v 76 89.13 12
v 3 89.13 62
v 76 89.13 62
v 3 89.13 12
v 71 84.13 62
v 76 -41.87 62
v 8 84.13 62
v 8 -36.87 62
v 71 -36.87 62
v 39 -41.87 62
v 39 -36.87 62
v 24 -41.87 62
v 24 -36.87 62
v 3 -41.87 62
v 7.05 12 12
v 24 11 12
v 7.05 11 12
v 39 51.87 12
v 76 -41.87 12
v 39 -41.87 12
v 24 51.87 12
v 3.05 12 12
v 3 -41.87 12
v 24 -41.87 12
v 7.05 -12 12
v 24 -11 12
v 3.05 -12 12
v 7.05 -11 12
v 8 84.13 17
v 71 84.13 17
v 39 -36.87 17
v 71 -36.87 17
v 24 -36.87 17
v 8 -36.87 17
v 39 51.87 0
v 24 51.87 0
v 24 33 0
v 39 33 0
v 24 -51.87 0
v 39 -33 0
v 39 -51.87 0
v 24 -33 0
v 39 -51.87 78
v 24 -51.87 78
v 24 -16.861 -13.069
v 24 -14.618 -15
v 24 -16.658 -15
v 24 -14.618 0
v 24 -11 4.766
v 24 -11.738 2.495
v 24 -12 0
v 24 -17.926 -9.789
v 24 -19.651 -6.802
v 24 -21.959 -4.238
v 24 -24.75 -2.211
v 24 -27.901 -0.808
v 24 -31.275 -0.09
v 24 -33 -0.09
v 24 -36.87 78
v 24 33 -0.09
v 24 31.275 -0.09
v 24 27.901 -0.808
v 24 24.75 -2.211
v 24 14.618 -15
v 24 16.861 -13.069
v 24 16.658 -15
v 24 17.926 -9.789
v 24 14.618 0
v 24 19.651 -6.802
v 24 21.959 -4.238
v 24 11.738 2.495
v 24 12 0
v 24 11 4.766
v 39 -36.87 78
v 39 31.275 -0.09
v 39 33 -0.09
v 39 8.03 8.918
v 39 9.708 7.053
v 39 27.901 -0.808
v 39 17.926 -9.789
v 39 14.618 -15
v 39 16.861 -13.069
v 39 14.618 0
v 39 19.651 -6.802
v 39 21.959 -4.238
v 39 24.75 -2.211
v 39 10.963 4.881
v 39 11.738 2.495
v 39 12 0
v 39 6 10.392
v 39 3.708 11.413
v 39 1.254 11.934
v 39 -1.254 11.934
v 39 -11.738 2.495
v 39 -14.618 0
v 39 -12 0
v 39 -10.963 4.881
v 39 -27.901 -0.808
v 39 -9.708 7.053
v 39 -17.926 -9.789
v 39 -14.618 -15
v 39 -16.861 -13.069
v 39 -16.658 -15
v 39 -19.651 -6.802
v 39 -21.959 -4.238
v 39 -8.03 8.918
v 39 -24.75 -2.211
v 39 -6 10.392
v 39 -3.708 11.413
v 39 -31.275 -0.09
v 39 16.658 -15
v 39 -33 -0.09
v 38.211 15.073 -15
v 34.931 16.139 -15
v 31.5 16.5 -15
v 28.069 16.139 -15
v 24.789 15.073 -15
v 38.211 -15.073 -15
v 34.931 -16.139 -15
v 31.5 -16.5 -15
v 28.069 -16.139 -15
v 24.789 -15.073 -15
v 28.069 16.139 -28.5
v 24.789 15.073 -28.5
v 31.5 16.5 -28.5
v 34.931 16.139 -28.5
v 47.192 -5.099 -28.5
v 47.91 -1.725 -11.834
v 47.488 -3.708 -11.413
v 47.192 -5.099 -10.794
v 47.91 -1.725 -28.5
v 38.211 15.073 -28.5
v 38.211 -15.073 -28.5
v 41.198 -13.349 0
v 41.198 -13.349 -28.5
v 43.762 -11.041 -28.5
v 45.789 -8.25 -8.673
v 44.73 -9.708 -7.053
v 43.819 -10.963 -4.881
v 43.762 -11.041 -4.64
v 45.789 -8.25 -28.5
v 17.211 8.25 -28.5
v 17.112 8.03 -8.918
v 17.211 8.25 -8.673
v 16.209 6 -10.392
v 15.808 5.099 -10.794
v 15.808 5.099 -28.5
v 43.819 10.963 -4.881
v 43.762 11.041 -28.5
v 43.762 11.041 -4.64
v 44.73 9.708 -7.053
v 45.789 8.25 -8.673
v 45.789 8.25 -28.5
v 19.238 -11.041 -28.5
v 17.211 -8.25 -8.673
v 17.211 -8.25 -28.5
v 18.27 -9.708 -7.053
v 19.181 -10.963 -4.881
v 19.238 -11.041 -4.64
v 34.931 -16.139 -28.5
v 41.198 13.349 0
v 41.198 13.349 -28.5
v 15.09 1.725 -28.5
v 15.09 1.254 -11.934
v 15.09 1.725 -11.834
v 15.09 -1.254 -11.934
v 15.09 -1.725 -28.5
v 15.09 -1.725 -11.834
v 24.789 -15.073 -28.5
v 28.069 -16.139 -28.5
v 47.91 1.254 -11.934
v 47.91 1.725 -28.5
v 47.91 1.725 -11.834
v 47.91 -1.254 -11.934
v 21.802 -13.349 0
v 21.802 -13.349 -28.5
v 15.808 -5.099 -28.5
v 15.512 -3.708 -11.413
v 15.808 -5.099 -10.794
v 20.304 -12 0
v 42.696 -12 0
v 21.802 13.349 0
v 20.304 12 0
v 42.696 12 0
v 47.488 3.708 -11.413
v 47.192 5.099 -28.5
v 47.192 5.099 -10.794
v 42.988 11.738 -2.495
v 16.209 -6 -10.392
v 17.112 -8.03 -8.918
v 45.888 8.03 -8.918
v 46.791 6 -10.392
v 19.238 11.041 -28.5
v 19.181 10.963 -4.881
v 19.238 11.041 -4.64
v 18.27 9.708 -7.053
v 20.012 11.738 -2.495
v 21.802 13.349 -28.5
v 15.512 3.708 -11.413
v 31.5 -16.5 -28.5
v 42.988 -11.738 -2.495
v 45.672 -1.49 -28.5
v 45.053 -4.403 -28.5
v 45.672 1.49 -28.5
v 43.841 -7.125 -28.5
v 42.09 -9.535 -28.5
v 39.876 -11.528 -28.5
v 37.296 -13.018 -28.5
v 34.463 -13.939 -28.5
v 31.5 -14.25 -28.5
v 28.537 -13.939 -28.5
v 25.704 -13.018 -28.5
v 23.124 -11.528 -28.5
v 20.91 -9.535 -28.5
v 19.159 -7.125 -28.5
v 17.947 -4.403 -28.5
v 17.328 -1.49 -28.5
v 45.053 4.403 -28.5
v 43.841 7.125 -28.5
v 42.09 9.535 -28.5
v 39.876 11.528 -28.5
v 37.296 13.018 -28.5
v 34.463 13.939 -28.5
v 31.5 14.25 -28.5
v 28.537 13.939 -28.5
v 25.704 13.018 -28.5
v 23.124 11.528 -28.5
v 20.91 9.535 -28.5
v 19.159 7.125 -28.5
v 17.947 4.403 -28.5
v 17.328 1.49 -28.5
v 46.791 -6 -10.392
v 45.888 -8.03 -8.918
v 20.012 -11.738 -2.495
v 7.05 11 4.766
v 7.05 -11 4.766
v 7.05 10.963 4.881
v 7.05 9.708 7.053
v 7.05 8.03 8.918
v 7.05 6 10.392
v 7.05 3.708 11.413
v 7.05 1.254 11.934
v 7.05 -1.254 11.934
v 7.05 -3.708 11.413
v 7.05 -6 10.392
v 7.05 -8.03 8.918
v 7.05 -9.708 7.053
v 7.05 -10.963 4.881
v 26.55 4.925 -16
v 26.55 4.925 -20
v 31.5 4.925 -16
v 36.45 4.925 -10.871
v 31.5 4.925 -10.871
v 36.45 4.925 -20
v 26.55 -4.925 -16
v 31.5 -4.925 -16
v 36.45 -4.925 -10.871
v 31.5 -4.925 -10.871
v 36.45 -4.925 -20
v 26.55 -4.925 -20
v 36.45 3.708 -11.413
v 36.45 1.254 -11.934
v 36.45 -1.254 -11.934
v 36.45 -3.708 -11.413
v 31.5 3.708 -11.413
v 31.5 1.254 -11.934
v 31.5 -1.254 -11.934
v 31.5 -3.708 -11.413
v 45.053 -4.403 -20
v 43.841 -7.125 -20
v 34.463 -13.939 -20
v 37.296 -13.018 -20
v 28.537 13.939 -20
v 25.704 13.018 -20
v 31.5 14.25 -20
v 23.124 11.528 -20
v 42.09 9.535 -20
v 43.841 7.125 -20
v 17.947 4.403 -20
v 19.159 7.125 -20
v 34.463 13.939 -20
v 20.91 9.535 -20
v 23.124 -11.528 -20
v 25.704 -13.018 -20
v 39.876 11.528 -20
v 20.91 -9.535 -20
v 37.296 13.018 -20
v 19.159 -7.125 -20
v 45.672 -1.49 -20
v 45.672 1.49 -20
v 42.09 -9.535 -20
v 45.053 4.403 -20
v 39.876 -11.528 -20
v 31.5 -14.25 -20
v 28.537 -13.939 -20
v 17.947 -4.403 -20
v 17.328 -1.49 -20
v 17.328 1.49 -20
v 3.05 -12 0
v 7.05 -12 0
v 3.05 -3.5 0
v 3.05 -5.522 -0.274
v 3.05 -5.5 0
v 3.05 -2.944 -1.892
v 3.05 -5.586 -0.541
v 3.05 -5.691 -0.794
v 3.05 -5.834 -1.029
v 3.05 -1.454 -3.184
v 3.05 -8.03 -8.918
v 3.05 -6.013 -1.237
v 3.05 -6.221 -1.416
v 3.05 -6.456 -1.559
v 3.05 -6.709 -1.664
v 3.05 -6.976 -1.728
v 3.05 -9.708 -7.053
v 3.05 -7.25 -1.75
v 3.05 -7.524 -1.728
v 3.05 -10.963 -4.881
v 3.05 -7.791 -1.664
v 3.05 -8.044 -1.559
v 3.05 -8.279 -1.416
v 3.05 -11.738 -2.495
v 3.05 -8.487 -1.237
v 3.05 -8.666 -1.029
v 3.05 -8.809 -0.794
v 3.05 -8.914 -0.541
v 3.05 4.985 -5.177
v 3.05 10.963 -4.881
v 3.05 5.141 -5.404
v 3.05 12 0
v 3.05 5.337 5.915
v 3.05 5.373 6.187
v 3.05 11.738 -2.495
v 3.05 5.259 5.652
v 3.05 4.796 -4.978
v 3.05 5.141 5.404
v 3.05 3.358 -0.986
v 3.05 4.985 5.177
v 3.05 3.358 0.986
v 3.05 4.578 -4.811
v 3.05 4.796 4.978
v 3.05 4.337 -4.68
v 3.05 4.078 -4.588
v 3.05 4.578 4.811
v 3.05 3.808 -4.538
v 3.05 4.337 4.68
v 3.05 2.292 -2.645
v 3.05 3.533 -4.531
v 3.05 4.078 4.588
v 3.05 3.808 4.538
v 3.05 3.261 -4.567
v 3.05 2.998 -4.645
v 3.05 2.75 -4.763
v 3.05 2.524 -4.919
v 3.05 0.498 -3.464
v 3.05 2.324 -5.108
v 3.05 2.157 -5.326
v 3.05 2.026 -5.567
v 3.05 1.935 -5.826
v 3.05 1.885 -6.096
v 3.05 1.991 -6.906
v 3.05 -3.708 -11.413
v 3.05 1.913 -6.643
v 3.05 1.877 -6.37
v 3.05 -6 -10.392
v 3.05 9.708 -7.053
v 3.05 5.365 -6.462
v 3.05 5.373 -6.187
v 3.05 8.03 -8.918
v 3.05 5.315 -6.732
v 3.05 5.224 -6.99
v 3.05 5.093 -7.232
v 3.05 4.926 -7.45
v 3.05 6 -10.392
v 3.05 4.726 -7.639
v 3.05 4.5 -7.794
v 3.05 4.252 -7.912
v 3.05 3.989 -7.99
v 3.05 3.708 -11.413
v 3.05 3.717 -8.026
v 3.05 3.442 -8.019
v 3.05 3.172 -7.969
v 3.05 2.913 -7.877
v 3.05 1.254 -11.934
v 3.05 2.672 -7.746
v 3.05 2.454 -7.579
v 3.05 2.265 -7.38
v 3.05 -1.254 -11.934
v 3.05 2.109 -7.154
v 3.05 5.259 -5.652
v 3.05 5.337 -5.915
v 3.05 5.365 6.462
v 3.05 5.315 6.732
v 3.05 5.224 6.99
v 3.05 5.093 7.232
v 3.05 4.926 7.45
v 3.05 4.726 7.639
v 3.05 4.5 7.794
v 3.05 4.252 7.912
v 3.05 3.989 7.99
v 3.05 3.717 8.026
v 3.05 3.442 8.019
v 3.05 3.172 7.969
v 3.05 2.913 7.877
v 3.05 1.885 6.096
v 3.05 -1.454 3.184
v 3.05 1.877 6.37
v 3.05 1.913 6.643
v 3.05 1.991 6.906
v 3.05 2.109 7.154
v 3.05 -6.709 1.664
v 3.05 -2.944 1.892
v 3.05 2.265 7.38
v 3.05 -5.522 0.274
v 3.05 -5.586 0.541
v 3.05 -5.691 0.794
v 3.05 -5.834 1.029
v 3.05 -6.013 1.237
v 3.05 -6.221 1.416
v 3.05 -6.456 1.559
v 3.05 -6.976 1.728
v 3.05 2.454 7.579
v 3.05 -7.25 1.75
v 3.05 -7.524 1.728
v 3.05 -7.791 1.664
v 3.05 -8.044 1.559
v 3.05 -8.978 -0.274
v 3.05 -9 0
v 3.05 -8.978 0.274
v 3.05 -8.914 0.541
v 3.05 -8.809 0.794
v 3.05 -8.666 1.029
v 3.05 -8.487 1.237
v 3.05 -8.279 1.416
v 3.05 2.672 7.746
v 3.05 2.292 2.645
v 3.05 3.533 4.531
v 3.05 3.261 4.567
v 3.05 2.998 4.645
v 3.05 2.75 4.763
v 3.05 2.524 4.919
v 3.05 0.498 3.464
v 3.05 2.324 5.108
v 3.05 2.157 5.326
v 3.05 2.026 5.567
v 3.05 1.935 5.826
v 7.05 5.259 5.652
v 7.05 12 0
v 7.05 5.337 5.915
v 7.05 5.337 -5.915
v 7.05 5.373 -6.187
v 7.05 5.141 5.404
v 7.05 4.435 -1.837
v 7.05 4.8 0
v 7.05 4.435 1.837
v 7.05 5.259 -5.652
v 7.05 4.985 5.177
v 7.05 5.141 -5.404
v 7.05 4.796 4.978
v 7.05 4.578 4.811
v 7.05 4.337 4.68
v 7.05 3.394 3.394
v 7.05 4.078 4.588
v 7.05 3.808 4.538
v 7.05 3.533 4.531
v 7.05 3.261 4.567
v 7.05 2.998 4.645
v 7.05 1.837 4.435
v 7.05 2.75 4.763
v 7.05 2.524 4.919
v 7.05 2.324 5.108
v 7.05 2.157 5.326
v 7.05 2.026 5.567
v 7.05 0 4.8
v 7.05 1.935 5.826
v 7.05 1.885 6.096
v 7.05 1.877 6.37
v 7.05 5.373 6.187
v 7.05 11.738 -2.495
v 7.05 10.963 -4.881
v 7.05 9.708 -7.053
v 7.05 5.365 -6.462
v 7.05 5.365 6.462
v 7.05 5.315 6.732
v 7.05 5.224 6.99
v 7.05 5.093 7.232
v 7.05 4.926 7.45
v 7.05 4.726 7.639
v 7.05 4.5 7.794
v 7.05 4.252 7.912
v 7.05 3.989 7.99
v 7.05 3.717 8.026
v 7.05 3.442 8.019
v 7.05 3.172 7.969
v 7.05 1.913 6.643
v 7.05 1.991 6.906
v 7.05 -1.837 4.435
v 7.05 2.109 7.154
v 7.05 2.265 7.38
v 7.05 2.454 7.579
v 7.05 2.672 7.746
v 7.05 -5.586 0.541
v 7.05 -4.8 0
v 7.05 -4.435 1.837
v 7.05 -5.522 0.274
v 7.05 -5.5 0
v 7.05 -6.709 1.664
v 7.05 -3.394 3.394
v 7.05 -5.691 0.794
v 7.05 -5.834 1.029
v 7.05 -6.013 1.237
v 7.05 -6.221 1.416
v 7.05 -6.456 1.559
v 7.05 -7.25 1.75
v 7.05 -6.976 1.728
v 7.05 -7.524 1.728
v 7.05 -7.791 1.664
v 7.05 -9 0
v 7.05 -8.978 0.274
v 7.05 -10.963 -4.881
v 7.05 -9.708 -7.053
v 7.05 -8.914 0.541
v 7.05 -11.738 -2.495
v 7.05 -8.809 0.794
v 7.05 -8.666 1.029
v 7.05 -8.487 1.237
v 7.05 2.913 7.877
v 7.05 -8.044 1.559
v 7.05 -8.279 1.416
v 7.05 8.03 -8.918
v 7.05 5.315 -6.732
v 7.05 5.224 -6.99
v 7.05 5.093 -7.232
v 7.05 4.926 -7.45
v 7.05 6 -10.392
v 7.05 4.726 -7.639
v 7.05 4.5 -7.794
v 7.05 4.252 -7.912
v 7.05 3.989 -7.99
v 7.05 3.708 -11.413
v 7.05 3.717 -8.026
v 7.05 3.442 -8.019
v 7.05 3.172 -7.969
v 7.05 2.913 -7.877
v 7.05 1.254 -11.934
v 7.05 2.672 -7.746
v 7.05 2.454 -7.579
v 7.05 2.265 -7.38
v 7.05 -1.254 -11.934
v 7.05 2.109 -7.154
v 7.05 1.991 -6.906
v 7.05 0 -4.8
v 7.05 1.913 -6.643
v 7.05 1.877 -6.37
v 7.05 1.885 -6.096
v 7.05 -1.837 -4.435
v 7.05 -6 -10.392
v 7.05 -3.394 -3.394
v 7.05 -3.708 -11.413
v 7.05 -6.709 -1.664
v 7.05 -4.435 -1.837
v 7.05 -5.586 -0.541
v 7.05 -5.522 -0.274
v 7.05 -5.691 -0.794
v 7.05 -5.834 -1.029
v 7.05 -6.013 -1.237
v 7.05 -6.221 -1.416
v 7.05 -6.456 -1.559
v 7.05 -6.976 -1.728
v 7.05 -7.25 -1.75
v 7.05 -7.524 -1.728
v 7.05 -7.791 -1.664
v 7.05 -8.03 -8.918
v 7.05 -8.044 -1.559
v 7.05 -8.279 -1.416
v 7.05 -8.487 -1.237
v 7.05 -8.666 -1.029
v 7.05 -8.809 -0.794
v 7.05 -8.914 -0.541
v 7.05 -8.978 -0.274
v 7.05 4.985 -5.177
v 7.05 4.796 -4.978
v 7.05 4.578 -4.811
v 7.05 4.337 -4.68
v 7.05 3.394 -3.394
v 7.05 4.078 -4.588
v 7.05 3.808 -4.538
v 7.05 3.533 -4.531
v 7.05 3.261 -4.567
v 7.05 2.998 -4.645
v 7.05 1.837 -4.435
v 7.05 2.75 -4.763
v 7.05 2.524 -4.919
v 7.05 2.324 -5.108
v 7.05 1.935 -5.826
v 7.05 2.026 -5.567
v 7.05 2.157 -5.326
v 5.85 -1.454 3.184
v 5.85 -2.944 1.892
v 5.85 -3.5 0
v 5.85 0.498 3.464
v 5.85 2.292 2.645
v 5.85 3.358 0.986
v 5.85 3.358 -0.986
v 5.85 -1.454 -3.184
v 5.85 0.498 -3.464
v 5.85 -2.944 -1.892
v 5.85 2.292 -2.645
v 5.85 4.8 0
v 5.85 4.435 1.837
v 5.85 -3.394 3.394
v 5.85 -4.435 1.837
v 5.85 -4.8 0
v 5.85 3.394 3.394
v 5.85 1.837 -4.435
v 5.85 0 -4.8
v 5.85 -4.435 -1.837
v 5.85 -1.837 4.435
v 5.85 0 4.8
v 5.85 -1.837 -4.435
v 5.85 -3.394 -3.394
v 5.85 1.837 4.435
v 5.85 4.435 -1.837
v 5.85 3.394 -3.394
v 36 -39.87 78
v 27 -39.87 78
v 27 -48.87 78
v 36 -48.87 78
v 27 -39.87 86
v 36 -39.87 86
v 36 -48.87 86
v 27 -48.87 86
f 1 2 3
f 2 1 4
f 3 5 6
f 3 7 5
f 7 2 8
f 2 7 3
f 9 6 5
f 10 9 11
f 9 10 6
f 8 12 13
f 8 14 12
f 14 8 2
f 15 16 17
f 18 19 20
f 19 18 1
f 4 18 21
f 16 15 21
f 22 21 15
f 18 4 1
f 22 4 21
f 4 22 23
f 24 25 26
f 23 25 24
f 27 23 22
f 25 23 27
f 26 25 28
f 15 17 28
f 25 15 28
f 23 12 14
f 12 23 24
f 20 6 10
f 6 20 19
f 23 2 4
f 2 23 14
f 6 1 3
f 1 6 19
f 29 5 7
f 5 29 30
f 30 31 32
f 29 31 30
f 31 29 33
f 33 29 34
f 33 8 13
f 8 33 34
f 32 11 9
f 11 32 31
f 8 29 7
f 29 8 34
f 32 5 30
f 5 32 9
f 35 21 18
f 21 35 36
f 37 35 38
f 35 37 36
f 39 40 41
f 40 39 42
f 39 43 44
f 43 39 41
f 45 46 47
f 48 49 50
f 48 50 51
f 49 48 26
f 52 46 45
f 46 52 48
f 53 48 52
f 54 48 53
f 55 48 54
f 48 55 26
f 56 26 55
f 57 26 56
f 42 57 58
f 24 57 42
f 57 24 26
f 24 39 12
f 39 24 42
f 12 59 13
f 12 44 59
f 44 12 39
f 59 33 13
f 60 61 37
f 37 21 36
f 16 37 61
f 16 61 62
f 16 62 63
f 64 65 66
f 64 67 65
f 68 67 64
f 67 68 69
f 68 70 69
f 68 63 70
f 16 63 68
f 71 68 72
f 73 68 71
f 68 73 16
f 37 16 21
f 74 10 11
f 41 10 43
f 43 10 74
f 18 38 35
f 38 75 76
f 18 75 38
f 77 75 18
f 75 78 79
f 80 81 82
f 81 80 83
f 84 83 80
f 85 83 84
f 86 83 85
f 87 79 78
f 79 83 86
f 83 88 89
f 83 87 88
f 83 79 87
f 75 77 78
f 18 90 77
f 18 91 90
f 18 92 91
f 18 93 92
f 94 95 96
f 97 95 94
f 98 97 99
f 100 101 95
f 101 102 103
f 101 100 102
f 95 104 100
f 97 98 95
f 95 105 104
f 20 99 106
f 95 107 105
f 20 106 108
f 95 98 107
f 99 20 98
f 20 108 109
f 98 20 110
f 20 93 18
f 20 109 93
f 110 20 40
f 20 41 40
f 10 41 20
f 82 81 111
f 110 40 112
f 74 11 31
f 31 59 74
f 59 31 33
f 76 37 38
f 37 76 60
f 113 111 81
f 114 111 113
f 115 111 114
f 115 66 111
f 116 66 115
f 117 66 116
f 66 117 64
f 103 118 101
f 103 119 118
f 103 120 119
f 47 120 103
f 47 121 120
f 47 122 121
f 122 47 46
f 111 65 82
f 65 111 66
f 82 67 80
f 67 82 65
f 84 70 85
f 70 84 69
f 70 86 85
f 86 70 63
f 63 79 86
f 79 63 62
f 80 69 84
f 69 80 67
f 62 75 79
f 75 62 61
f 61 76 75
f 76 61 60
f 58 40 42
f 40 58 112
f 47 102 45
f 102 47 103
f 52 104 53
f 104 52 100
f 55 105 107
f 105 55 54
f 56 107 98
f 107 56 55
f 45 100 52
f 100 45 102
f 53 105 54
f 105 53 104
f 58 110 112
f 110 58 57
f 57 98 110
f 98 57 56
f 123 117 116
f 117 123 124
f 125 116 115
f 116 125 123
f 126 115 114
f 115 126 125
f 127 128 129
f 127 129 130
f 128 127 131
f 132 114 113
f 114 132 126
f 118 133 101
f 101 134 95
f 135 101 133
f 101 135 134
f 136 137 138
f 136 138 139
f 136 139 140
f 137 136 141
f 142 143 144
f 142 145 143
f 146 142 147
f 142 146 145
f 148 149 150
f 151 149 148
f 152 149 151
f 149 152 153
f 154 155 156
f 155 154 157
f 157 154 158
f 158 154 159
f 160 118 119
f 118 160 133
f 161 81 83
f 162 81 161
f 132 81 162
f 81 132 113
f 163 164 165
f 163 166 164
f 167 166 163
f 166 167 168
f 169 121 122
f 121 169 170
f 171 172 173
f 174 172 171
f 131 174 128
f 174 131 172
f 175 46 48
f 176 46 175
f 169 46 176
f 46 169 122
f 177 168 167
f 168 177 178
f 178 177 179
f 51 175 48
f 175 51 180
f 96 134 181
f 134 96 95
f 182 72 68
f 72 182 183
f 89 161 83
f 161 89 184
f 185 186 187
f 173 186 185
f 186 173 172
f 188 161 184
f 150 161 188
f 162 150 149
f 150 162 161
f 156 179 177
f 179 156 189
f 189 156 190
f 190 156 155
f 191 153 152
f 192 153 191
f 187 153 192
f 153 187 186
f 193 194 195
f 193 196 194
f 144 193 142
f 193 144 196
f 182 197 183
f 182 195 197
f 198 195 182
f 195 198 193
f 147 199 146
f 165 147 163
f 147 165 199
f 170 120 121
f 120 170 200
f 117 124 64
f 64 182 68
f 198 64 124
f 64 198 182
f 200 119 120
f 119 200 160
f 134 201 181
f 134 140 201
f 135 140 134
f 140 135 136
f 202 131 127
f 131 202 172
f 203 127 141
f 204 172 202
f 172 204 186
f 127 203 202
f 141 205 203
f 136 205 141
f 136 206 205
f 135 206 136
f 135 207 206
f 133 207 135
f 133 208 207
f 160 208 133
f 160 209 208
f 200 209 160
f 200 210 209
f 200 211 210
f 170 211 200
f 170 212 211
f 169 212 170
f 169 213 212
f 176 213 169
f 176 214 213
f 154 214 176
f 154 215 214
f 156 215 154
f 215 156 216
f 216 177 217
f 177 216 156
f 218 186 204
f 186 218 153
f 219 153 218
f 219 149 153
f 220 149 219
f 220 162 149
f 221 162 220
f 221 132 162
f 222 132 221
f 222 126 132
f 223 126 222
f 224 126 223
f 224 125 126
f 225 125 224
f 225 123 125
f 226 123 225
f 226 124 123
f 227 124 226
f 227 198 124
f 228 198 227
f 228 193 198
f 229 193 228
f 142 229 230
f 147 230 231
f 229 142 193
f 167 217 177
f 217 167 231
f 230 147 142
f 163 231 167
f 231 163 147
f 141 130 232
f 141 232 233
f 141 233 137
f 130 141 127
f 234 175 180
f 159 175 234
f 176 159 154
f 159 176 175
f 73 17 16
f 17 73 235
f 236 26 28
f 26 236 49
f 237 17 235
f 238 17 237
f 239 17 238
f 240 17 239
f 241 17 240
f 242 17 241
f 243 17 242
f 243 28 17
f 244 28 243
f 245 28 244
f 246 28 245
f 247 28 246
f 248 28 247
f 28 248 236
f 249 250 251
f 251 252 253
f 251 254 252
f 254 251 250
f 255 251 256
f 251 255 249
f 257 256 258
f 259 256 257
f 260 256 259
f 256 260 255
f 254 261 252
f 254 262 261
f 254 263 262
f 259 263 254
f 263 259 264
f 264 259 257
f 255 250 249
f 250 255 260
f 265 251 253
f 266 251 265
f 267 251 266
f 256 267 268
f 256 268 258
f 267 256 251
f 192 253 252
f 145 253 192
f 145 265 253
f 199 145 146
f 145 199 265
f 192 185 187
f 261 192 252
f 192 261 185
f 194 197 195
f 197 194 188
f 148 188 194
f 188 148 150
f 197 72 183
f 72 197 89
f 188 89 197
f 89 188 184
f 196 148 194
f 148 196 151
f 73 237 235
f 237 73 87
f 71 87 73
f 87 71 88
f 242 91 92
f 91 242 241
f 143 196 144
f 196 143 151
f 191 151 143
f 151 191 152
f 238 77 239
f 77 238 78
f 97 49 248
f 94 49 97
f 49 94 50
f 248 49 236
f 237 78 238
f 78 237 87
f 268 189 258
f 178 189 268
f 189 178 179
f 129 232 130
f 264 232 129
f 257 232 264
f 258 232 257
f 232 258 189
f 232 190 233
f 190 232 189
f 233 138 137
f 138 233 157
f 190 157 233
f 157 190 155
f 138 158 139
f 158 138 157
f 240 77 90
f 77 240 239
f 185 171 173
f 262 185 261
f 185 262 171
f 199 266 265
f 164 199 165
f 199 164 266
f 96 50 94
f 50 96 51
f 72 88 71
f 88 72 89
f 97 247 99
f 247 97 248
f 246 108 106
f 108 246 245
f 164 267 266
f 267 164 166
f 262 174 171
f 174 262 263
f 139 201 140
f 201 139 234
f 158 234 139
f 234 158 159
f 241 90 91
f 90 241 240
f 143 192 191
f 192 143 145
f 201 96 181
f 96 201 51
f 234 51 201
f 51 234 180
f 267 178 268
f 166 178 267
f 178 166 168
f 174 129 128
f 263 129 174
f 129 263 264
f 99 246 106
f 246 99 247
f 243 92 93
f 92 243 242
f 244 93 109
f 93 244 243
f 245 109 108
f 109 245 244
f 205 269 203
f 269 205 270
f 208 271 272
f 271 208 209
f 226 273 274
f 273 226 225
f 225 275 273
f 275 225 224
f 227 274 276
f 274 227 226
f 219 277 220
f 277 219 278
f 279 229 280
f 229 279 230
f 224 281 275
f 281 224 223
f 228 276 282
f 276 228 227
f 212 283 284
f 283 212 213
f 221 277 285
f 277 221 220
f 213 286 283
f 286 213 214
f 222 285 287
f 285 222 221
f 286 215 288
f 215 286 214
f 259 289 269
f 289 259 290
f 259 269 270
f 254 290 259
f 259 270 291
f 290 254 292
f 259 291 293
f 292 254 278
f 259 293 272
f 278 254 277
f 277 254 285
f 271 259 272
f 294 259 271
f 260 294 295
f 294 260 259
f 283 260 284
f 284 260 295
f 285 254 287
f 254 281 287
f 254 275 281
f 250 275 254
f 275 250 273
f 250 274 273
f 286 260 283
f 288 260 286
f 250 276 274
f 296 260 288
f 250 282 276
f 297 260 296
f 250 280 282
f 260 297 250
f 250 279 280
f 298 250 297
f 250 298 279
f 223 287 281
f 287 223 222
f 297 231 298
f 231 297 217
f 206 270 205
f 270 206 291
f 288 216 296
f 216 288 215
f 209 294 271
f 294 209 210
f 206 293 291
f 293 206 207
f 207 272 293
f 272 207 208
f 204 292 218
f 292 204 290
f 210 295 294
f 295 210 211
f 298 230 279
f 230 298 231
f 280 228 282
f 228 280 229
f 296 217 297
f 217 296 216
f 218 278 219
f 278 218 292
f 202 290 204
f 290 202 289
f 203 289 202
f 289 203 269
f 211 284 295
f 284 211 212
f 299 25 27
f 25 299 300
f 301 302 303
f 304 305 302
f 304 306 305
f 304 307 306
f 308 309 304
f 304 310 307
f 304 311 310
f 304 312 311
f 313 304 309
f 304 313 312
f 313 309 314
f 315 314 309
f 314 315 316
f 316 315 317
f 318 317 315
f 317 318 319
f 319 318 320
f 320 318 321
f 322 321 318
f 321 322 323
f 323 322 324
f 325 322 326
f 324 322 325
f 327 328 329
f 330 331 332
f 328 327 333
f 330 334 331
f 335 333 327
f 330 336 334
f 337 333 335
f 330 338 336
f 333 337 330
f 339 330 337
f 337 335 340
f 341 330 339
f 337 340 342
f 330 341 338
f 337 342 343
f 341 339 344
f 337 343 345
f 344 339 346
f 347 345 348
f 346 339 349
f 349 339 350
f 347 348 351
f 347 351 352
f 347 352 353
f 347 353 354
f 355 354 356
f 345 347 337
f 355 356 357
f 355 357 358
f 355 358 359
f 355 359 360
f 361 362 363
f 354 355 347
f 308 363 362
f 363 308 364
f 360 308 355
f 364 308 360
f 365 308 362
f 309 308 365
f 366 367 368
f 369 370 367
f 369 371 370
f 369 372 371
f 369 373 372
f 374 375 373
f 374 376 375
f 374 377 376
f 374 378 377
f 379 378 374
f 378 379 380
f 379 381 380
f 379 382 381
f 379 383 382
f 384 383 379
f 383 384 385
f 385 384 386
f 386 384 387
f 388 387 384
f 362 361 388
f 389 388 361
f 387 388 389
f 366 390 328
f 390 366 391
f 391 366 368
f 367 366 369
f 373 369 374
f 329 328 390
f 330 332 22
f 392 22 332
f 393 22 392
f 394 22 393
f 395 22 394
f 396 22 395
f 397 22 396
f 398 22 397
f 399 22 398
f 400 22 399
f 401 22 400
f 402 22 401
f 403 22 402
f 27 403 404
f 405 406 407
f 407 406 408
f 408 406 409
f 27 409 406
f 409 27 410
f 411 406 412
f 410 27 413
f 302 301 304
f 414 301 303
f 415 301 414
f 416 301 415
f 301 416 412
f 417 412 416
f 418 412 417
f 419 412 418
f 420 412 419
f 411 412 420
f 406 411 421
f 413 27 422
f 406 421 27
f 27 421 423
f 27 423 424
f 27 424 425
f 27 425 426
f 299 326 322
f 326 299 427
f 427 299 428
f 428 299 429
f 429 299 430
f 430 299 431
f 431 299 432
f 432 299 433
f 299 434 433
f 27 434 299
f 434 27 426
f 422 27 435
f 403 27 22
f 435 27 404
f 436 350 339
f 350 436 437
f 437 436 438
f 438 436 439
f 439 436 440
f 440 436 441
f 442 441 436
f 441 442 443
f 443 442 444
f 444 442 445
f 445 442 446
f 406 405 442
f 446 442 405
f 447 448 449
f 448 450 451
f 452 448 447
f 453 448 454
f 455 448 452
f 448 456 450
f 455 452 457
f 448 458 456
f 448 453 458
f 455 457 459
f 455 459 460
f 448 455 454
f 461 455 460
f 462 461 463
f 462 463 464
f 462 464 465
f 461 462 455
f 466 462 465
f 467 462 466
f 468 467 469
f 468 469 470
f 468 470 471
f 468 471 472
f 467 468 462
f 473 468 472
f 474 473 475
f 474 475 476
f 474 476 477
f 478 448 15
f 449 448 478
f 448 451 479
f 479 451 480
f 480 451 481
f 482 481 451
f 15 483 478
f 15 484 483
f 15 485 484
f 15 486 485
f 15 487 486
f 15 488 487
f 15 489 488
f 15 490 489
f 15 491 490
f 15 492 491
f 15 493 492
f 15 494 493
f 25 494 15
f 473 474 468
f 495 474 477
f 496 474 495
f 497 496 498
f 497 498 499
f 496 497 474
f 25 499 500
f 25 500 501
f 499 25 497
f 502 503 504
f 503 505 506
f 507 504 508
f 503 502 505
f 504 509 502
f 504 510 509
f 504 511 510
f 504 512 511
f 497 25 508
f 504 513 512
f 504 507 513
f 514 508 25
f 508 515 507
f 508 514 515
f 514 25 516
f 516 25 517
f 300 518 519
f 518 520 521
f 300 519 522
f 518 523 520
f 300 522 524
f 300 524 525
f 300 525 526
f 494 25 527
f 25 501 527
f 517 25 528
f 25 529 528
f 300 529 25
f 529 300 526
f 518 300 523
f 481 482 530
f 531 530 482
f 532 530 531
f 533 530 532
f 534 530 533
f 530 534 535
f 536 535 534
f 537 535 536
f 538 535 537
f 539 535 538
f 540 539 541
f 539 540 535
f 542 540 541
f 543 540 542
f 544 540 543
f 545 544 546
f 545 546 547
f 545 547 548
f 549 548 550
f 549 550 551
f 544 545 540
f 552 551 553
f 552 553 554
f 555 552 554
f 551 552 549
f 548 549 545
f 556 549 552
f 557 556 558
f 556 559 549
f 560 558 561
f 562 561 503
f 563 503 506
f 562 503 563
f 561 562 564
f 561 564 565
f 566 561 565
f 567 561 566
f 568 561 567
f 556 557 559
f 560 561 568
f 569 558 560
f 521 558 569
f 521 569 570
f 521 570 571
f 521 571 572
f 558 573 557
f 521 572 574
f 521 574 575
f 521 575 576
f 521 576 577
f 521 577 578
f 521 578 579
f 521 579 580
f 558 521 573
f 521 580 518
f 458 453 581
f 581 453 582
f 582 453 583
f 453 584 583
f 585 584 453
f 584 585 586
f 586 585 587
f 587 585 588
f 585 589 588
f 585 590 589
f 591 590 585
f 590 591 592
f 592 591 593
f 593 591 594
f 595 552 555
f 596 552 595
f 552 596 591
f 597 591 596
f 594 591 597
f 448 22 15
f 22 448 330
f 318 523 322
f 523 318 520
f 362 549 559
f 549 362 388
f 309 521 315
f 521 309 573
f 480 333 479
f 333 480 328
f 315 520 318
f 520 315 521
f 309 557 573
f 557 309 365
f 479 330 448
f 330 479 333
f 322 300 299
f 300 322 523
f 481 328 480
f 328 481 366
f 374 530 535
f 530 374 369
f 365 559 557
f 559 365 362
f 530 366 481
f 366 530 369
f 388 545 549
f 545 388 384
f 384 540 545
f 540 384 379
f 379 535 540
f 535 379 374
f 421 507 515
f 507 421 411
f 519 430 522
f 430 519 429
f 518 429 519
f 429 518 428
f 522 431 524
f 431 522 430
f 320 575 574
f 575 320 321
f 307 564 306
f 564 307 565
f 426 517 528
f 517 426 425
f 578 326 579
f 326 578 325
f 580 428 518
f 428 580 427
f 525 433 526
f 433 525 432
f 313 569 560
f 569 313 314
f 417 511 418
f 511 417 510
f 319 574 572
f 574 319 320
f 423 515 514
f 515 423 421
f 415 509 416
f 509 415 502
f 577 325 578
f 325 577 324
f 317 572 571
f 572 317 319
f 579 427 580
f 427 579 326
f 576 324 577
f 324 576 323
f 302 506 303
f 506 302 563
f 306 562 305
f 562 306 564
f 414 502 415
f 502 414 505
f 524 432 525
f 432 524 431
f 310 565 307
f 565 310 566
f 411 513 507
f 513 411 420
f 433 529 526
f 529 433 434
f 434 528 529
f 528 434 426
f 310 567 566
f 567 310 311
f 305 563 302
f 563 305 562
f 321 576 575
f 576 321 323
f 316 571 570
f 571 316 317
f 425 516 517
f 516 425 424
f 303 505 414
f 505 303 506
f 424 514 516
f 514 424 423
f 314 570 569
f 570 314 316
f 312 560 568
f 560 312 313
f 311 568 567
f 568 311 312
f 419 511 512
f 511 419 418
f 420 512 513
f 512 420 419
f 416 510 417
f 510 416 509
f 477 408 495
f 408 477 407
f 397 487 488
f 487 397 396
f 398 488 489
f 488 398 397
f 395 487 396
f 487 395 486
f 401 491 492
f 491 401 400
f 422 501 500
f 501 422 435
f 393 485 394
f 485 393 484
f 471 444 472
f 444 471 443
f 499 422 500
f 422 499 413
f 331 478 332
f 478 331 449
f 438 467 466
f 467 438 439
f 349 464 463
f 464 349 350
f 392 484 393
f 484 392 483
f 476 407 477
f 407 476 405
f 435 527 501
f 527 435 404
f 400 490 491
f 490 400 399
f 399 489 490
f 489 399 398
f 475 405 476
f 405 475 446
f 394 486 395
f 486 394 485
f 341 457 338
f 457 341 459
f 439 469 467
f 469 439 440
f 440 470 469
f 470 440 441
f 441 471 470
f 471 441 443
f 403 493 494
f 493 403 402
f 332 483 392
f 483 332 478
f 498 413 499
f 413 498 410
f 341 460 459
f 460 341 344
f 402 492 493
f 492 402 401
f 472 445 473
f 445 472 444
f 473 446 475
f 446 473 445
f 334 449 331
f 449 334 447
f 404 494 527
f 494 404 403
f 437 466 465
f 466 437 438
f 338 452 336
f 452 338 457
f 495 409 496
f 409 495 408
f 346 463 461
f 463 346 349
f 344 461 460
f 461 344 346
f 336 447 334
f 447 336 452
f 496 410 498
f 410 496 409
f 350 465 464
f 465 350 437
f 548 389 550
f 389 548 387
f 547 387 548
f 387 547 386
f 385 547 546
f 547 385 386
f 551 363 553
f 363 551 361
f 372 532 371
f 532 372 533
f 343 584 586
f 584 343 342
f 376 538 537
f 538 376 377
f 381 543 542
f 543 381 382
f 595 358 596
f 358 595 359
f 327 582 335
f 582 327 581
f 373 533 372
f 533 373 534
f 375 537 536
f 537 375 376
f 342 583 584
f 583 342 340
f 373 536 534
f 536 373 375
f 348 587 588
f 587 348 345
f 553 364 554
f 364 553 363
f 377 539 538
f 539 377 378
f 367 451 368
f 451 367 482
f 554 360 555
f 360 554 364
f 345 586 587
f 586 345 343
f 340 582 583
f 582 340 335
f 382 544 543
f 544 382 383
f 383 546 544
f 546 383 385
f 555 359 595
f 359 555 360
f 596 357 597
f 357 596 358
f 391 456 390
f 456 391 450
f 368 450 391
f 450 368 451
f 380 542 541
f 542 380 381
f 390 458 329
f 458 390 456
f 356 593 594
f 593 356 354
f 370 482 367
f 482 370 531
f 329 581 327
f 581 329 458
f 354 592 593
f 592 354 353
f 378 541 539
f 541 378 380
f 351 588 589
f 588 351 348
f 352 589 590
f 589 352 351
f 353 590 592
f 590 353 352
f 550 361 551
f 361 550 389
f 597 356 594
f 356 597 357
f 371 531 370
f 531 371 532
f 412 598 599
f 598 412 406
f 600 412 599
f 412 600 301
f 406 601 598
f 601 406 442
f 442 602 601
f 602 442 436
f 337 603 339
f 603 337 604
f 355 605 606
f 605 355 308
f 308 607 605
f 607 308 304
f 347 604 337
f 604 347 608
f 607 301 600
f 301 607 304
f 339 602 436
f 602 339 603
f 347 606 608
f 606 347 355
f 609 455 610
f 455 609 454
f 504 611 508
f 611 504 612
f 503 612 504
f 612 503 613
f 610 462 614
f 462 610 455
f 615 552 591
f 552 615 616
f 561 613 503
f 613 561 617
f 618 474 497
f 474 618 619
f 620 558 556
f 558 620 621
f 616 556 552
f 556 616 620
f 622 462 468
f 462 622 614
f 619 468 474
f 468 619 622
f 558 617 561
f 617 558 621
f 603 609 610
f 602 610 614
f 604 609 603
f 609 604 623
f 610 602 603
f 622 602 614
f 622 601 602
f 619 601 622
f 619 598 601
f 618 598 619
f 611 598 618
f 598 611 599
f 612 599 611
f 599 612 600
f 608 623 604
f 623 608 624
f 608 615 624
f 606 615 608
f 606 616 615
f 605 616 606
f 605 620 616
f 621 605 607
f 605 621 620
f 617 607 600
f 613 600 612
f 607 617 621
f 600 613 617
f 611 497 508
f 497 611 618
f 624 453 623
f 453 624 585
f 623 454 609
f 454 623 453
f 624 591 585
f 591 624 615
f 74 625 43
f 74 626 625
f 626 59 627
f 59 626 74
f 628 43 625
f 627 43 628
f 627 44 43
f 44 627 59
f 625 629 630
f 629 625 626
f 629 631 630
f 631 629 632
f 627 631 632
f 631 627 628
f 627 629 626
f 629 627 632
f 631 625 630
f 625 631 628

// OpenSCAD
// file: tripodBase.scad
include <params.scad>
use <motor.scad>
use <parametric_gear.scad>
use <tripodArm.scad>
/*
   translate([0,0,-gearDistance]) tribase();
 *translate([0,-motorL1,0]) rotate(-90,[1,0,0]) faulhaber();
 *translate([0,0,-gearDistance+15+bearingH]) rotate(180,[1,0,0]) potentiometer();
 tripodArm();
 */
tribase();
module tribase(){
  difference(){
    union(){
      bevel_gear_pair(
          gear1_teeth = 18,
          gear2_teeth = 8
          );
      *translate([0,0,16.5]) union(){
        cylinder(r=bearingBW/2,h=bearingT);
        difference(){
          cylinder(r=bearingIW/2,h=bearingH+bearingT);
          translate([0,0,bearingH+bearingT]) rotate(180,[1,0,0]) potentiometer();
        }
      }
      *translate([0,0,-25]) cylinder(r=27,h=30);
    }
    *for(n=[0,1,-1]){
      rotate([-30,0,120*n]) baseleg();
    }
  }
}
module baseleg(w=legW,l=legL, h=legH){
  translate([-w/2,-l/3,-h/2]) union(){
    cube([w,30,h]);
    translate([5,30,0]) cube([10,100,10]);
  }
}
// file: canHolder.scad
include <params.scad>


module motorAttachment(rA,rB,h,mH,rC,d){
  difference()
  {
    cylinder(r=rA,h=h,$fn=30);
    translate([0,0,h-mH]) cylinder(r=rB,h=mH,$fn=50);
    translate([0,0,h-d]) rotate([90,0,0]) cylinder(r=rC,h=rA, $fn=40); 
    translate([0,0,h-d]) rotate([-90,0,0]) cylinder(r=rC,h=rA, $fn=40); 
    translate([0,0,h-d-rC*1.5]) rotate([0,90,0]) cylinder(r=rC,h=rA, $fn=40); 
    translate([0,0,h-d-rC*1.5]) rotate([0,-90,0]) cylinder(r=rC,h=rA, $fn=40); 
  }
}
// file: motor.scad
include <params.scad>

faulhaber();
module faulhaber(d1 = motorD1, d2 = motorD2 ,d3 = motorDsh,df3 = motorDfl,l1 = motorL1,l2 = motorL2, l3 = motorL3){
  union(){
    color("black") cylinder(r=d1/2,h=l1);
    difference(){
      color("blue",0.9) translate([0,0,l1]) cylinder(r=d2/2,h=l2);
      translate([0,0,l1+l2]) motorHoles();
    }
    color("silver") translate([0,0,l1+l2]) motorShaft();
  }
}
module motorShaft(d=motorDsh,df=motorDfl,h=motorL3){
  difference(){ 
    cylinder(r=d/2,h=h,$fn=80);
    translate([-d/2,d/2-(d-df),0]) cube([d,d,h+2]);
    echo(d-df);
  }
}

module motorHoles(d = motorScrewD,l=motorHoleLenTo,h = motorScrewL){
  translate([0,0,-h])  union(){
    translate([l,0,0]) cylinder(r=d/2,h=h,$fn=40);
    rotate([0,0,120]) translate([l,0,0]) cylinder(r=d/2,h=h,$fn=40);
    rotate([0,0,-120]) translate([l,0,0]) cylinder(r=d/2,h=h,$fn=40);
  }
}
// file: params.scad
inch = 25.4;

canDiameter = 3.1*inch;
canLength = 9.2 * inch;

bearingW1 = 28+0.5;
bearingW2 = 32+1;
bearingIW = 16;
bearingBW = 25;
bearingH = 8;
bearingT = 1;

motorD1 = 22;
motorD2 = 20;
motorDfl = 3.6+0.25;
motorDsh = 4+0.25;
motorFl = 7.5;
motorL1 = 23.45;
motorL2 = 47.8-motorL1;
motorL3 = 64.52 - 3.08 - motorL1 - motorL2;

motorScrewD = 2.5;
motorHoleLenTo = motorD2/2 -( 1.5+motorScrewD/2);
motorScrewL = 4;
canToclampTolerance = 2;
clampLength = canLength / 2;
clampThickness = 5;
clampSpace = 25;

brainH = 45;
brainW = 63;
brainL = 121;
boxT = 5;
boxClearance = 10;

armInnerW = canDiameter + clampThickness*2;
armThickness = 15;
armHeight = canDiameter/2 + clampThickness + brainH + boxClearance; 

gearDistance = 42+1.5;
legW = 20-0.5;
legL = 200;
legH = legW;

potTh = 4.5;
potW = 9.6 + 0.25;
potL = 9.65 + 0.25;
potLen = 12.63-potTh;
potRad = 3.55/2+0.25;
potSlit = 1;
potSlitL = 1.5;

megaR = 1.3;
megaIn = 2.5;
megadx = 24.1;
megadxy = 15.2;
megady = 27.9;
// main file
include <params.scad>
use <motor.scad>
use <canHolder.scad>
use <parametric_gear.scad>
use <tripodBase.scad>
module tripodArm(
    w=armInnerW, 
    t = armThickness, 
    h = armHeight){
  union(){
    translate([-w/2+t/2,-8,motorD1/2+1]) brainBox();
    difference(){
      union(){
        translate([0,0,(h+2*t)/2]) difference(){
          cube([w + t, t, h+2*t],center=true);
          translate([t/2,0,t/2 + 1/2]) cube([ w, t, h+t + 1],center=true);
        }
        translate([0,0,-gearDistance+15]) cylinder(r=bearingW2/2,h=gearDistance-15);
        for(n = [0,1]){
          difference(){
            rotate(180*n,[0,0,1]) translate([0,-t/2,-t]) cube([bearingW2,t,bearingW2/2]);
            rotate(180*n,[0,0,1]) translate([bearingW2,t/2+1,-bearingW2/2]) rotate(90,[1,0,0]) cylinder(r=bearingW2/2,h=t+2);
          }
        }
        // motor mount arm
        translate([-motorD1/2,0,0]) cube([motorD1,motorL1+1,t]);
      }
      translate([0,-motorL1,0]) rotate(-90,[1,0,0]) cylinder(r=motorD1/2+1,h=motorL1+motorL2+5);
      translate([0,0,-gearDistance+15]) cylinder(r=bearingW1/2,h=bearingH+.5);
      translate([0,0,-gearDistance+15+bearingH]) rotate(180,[1,0,0]) potentiometer();
    }
    // motor mount
    rotate(180,[0,1,0]) translate([0,motorL1+1,0]) 
      rotate(-90,[1,0,0]) difference(){
        union(){
          translate([-motorD1/2-1,0,0]) cube([motorD1+2,motorD1/2+t-motorD1/2,4]);
          cylinder(r=motorD1/2+1,h=4);
        }
        translate([0,0,4]) motorHoles(d = motorScrewD+1,l=motorHoleLenTo,h = 4);
        cylinder(r=3.5,h=4);
        cylinder(r=4.8,h=1.2);
      }
  }
}

module potentiometer(t = potTh, w=potW, d = potL, r=potRad, l=potLen, s=potSlit,sl = potSlitL){
  translate([0,0,-t]) union(){
    difference(){
      color("white") translate([0,0,t]) cylinder(r=r,h=l,$fn=20);
      translate([-r,-s/2,t+l-sl]) cube([r*2,s,sl]);
    }
    color("blue", 0.9) translate([-w/2,-d/2,0]) cube([w,d,t]);
    color("silver", 0.9) translate([-w/2,0,-11+t]) cube([w,d/2,11]);
  }
}

module bearing(
    d1 = bearingW1,
    d2 = bearingW2,
    d3 = bearingIW,
    h = bearingH,
    t = bearingT){
  difference(){
    union(){
      cylinder(r=d2/2,h=t,$fn=80);
      cylinder(r=d1/2,h=h+t,$fn=80);

    }
    cylinder(r=d3/2,h=h+t);
  }
}
module brainBox(
    t = boxT,
    w = brainW,
    l = brainL,
    h = brainH
    ){
  translate([-t,-t-w/2,0]) difference(){
    cube([l+2*t,w+2*t,h+t]);
    translate([t,t,t]) cube([l,w,h]);
  }
}
module canClamp(r1 = canDiameter/2+clampThickness, r2 = canDiameter/2-canToclampTolerance, h = clampLength, sw=clampSpace){
  difference()
  {
    union(){
      translate([0,0,h-10]) cylinder(r=r1,h=10,$fn=500);
      translate([0,0,h/2-7.5]) cylinder(r=r1,h=15,$fn=500);
      cylinder(r=r1,h=10,$fn=500);
#translate([-r1,canToclampTolerance/2,0]) cube([2*r1,r1-r2,h]);
    }
    cylinder(r=r2,h=h);
    translate([0,r1/2,h/2]) cube([sw*2,r1,h],center=true);
    translate([-100,armThickness/2,0]) cube([200,100,h]);
  }
}




%translate([-canDiameter/2-10,0,0]) union(){
translate([0, clampLength/2, armHeight + 2*armThickness-clampThickness - canToclampTolerance]) rotate([90,0,0]) canClamp();
union(){
  difference(){
    rotate(90,[0,0,0]) tripodArm();
    translate([-armInnerW/2 - armThickness,-armThickness,0]) 
      translate([-250,250,armHeight  + 2*armThickness - canDiameter/2 - 2*clampThickness -  canToclampTolerance]) rotate([180,0,0]) cube([500,500,300]);
  translate([-armThickness/2+ 2.5 -armInnerW/2,-armThickness/2+2.5,armHeight  + 2*armThickness - canDiameter/2 - 2*clampThickness -  canToclampTolerance]) cube([armThickness-5,armThickness-5,8]);
  }
}
}



translate([brainW/2,0,0]) rotate([0,0,90]) union(){
  difference(){
    rotate(90,[0,0,0]) tripodArm();
    translate([-armInnerW/2 - armThickness,-armThickness,0]) 
      translate([0,0,armHeight  + 2*armThickness - canDiameter/2 - 2*clampThickness -  canToclampTolerance]) cube([500,500,300]);
  }
  translate([-armThickness/2+ 3 -armInnerW/2,-armThickness/2+ 3 ,armHeight  + 2*armThickness - canDiameter/2 - 2*clampThickness -  canToclampTolerance]) cube([armThickness-6,armThickness-6,8]);
}
